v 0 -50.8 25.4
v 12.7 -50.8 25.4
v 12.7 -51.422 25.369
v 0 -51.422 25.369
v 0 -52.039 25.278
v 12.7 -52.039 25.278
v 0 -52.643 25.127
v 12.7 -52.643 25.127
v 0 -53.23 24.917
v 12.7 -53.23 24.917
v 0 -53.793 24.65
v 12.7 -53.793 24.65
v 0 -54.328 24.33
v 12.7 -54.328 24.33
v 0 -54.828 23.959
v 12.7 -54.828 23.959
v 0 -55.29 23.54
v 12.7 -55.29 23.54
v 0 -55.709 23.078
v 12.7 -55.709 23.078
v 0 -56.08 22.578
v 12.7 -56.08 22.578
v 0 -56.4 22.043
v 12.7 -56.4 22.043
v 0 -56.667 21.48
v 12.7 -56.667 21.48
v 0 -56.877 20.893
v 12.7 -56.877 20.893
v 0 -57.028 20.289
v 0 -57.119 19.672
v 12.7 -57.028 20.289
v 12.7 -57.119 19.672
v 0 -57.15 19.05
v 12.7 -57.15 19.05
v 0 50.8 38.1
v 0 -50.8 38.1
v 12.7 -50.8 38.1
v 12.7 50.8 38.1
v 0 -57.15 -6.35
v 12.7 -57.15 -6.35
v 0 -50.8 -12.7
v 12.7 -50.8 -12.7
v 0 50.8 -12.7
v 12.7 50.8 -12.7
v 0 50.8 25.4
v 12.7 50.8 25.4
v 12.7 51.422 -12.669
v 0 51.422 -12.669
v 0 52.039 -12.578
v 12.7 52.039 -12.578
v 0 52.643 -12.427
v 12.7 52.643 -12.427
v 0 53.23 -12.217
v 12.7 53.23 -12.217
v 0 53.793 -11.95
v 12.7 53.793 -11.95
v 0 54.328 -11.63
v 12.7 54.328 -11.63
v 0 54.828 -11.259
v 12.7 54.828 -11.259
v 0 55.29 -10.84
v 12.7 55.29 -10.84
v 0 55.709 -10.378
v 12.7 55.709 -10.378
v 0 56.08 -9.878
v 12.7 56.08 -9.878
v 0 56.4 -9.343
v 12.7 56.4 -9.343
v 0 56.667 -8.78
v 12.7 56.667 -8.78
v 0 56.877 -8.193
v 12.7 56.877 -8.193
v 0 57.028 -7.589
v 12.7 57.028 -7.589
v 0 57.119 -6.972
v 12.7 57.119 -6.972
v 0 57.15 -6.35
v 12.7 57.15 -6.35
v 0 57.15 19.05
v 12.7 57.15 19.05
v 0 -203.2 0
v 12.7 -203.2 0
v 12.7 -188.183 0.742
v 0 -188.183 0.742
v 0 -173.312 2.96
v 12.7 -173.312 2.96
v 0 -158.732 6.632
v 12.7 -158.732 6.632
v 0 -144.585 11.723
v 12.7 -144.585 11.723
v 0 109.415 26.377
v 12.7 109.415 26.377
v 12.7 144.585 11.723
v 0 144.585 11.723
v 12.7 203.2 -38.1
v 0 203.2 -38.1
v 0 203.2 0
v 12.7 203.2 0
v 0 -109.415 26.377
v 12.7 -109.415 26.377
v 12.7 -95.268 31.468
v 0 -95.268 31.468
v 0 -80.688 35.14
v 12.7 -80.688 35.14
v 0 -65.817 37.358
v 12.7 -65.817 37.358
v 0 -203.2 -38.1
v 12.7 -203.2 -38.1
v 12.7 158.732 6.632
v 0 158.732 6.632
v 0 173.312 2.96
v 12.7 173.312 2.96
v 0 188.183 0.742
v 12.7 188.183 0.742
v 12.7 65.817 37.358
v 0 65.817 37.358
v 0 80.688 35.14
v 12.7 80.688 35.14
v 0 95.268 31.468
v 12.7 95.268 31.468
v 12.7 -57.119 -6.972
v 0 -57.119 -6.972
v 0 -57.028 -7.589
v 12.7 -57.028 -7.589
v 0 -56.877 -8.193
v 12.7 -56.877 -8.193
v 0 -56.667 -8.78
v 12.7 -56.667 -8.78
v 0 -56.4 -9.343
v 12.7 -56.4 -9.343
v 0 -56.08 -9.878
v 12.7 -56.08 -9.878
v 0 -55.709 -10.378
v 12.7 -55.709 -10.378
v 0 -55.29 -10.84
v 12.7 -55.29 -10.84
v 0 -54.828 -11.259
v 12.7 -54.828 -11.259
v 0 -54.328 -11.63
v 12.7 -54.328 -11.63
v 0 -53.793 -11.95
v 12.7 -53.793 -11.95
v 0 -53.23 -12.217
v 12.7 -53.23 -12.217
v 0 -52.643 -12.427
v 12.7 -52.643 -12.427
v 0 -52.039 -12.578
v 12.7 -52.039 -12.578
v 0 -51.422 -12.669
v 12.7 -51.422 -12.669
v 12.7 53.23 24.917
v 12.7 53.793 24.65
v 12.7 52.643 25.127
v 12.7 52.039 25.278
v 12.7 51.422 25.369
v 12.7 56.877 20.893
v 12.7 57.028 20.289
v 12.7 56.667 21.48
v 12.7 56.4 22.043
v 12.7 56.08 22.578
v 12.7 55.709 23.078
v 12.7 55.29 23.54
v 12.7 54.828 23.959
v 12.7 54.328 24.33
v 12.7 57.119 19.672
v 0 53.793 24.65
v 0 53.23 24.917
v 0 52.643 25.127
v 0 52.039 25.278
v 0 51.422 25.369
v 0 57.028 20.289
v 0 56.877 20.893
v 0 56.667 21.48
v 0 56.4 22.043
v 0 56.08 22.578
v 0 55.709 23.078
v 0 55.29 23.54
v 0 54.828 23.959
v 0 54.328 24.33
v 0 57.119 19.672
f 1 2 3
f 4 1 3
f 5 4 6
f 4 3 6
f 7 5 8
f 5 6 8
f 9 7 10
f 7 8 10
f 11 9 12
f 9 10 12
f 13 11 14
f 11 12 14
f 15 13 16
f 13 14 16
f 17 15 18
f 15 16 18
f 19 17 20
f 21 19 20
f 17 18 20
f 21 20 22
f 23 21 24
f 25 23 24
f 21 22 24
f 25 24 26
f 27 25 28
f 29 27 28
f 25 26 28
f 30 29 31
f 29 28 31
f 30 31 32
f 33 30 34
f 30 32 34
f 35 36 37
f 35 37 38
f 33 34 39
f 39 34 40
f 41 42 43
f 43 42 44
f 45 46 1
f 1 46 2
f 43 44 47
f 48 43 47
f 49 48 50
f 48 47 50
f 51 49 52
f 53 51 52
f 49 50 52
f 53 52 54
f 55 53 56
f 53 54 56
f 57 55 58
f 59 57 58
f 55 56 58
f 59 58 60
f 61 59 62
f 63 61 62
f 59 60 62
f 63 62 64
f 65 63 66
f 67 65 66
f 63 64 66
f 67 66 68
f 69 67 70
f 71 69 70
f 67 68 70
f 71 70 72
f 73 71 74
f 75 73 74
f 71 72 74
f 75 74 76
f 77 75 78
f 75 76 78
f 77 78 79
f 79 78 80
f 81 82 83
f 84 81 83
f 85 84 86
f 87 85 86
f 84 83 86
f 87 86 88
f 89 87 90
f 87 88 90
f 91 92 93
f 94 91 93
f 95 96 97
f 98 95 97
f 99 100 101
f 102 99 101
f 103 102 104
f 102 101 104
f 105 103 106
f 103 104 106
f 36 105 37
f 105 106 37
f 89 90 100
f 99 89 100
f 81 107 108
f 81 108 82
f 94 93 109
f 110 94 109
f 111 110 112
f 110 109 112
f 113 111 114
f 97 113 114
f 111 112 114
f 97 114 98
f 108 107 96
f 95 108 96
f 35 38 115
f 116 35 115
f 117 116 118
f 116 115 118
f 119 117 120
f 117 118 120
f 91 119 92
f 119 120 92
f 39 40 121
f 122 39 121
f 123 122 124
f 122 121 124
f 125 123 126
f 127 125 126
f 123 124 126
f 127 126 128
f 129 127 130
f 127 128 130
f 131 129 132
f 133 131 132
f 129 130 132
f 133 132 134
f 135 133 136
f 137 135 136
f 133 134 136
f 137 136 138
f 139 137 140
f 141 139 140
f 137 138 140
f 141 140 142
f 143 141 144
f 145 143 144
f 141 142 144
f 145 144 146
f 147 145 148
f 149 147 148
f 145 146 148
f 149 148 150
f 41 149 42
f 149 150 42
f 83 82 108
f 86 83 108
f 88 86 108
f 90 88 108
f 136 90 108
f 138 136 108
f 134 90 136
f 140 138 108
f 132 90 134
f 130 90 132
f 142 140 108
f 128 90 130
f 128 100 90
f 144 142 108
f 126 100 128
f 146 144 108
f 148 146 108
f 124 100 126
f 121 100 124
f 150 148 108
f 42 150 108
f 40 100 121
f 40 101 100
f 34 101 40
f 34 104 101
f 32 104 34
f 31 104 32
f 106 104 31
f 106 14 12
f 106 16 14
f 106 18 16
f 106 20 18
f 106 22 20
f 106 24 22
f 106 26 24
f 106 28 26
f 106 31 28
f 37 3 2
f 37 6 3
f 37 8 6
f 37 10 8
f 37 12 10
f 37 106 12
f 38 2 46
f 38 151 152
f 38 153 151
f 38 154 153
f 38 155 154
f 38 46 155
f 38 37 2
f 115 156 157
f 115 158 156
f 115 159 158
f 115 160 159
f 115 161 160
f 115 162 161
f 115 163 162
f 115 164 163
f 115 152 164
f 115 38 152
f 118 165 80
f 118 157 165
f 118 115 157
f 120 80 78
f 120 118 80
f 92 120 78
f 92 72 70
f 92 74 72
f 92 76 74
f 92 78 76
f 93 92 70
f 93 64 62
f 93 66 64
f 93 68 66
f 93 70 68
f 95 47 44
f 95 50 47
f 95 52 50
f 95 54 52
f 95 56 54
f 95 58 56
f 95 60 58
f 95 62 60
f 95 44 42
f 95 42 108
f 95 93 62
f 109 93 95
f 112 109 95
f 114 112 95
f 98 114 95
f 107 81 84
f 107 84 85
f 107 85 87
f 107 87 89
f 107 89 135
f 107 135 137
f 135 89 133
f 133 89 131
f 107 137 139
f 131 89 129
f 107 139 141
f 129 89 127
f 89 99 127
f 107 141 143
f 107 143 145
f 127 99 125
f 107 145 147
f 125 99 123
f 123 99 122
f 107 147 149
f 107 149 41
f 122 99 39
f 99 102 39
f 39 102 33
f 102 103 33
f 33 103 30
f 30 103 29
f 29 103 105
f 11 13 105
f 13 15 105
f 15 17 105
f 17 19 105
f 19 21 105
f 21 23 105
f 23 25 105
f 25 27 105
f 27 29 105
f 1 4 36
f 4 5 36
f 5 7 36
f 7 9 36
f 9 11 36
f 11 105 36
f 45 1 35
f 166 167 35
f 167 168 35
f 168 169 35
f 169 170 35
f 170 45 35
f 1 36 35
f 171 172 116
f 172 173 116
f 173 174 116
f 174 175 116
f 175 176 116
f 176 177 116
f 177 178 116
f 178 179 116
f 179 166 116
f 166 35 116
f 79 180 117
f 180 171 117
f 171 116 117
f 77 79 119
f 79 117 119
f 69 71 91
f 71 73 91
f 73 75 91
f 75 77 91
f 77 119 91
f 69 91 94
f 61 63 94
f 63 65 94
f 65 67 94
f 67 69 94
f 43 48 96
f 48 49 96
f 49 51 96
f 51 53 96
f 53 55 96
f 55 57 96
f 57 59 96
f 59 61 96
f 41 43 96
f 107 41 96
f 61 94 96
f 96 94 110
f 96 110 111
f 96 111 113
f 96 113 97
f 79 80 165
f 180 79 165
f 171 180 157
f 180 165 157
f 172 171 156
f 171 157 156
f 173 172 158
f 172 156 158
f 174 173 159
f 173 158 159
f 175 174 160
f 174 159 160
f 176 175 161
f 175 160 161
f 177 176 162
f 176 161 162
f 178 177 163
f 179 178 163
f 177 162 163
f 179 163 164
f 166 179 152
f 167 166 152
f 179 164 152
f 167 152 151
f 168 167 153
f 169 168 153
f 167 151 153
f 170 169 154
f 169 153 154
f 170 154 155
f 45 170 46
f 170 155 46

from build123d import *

# Parameters (mm, degrees)
F0_W     = 406.4
F0_H     = 76.2
F1_DEPTH = 12.7
F3_DEPTH = 62.484
F5_DEPTH = 38.608


with BuildPart() as f1:
    # F0 (on Right) → F1 (new body)
    with BuildSketch(Plane.YZ):
        Rectangle(F0_W, F0_H)
    extrude(amount=F1_DEPTH)

    # F2 (on face) → F3 (cut)
    with BuildSketch(Plane.YZ.offset(12.7)):
        with BuildLine():
            Line((50.8, 25.4), (-50.8, 25.4))
            ThreePointArc((-50.8, 25.4), (-55.290128, 23.540128), (-57.15, 19.05))
            Line((-57.15, 19.05), (-57.15, -6.35))
            ThreePointArc((-57.15, -6.35), (-55.290128, -10.840128), (-50.8, -12.7))
            Line((-50.8, -12.7), (50.8, -12.7))
            ThreePointArc((50.8, -12.7), (55.290128, -10.840128), (57.15, -6.35))
            Line((57.15, -6.35), (57.15, 19.05))
            ThreePointArc((57.15, 19.05), (55.290128, 23.540128), (50.8, 25.4))
        make_face()
    extrude(amount=-F3_DEPTH, mode=Mode.SUBTRACT)

    # F4 (on face) → F5 (cut)
    with BuildSketch(Plane.YZ.offset(12.7)):
        with BuildLine():
            Line((-203.2, 38.1), (-203.2, 0))
            ThreePointArc((-203.2, 0), (-173.311901, 2.959505), (-144.584615, 11.723077))
            Line((-144.584615, 11.723077), (-109.415385, 26.376923))
            ThreePointArc((-109.415385, 26.376923), (-80.688099, 35.140495), (-50.8, 38.1))
            Line((-50.8, 38.1), (-203.2, 38.1))
        make_face()
        with BuildLine():
            Line((109.415385, 26.376923), (144.584615, 11.723077))
            ThreePointArc((144.584615, 11.723077), (173.311901, 2.959505), (203.2, 0))
            Line((203.2, 0), (203.2, 38.1))
            Line((203.2, 38.1), (50.8, 38.1))
            ThreePointArc((50.8, 38.1), (80.688099, 35.140495), (109.415385, 26.376923))
        make_face()
    extrude(amount=-F5_DEPTH, mode=Mode.SUBTRACT)


solid = f1.part
